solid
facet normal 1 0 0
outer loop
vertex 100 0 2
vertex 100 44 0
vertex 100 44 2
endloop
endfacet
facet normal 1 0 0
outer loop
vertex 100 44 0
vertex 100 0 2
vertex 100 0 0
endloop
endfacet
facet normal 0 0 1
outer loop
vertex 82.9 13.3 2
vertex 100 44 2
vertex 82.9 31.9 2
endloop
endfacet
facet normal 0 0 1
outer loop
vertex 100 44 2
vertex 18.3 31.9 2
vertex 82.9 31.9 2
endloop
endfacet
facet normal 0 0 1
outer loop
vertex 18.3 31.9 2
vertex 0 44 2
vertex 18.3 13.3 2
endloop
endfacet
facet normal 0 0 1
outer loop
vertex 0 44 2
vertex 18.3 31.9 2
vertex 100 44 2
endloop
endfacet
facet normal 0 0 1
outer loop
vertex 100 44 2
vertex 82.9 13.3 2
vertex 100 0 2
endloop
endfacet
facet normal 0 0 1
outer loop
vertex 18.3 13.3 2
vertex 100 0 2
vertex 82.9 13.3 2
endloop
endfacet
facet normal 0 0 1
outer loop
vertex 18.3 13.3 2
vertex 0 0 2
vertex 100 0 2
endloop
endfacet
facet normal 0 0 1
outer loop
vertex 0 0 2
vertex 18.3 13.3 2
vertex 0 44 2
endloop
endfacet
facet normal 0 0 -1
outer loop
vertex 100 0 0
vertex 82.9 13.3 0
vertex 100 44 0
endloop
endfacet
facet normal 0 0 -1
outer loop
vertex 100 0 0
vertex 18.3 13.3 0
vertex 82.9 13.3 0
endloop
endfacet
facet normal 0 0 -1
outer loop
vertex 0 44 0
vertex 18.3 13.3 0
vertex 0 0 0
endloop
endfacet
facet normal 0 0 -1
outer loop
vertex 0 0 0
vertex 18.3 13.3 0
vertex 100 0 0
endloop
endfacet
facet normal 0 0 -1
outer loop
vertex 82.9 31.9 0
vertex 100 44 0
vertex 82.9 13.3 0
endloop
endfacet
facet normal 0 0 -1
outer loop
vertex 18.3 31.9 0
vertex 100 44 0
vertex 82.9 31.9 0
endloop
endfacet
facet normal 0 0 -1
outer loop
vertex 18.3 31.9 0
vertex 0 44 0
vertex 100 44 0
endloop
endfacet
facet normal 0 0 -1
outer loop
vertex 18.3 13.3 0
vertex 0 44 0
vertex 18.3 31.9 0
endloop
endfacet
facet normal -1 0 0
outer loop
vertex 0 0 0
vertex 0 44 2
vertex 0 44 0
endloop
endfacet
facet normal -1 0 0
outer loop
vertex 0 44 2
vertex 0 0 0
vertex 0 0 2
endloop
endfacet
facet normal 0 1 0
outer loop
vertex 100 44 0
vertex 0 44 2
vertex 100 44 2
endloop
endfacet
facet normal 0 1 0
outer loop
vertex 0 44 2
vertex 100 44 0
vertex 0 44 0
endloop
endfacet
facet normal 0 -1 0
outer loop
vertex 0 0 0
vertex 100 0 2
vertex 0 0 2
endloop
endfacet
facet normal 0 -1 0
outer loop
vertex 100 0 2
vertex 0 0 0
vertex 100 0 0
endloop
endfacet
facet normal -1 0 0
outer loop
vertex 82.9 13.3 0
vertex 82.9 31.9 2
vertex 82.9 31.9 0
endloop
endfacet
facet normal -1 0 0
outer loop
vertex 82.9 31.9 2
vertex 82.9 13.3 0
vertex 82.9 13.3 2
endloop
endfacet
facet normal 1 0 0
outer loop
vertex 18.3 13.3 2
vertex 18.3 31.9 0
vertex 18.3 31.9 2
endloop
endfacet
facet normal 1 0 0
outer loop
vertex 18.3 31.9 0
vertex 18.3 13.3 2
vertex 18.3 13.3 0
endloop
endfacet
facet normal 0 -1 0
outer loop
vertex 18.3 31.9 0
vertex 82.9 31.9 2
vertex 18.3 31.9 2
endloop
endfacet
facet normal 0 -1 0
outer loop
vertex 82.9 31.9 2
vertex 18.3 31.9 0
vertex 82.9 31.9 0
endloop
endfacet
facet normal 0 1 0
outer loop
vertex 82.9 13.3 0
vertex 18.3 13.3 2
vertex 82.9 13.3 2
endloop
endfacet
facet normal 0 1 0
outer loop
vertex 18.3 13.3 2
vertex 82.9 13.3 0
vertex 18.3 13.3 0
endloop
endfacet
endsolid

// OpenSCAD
//Train platform for Train Display Case

view_part = 0; //[0:top,1:base]


/* [Hidden] */
pa = 0.3;
cd = 0.1; //small value to ensure holes are through
station_ramp_x = 168;
station_ramp_y = 40;
station_ramp_z = 10;
centre_flat_x = 100;
centre_flat_y = 43;

flat_offset_x = (station_ramp_x - centre_flat_x)/2;

top_z = 2;
top_x = 100;
top_y = 44;
display_base_x = 56+pa;
display_base_y = 12.5+pa;

gutter_x = 64+pa;//surround for bottom
gutter_y = 18+pa;
gutter_z = 5;
gutter_off_x = (station_ramp_x - gutter_x)/2;
gutter_off_y = (station_ramp_y - gutter_y)/2;
gutter_wall_x = (gutter_x-display_base_x-2*pa)/2;
gutter_wall_y = (gutter_y-display_base_y-2*pa)/2;
top_offset_x = top_x/2 - (gutter_x - 3*pa)/2;
top_offset_y = top_y/2 - (gutter_y - 3*pa)/2;


cable_slot_x = display_base_x-2;//some value
cable_slot_y = 8;
exit_slot_x = 6;
exit_slot_z = 6;
exit_slot_y = 20;


if (view_part == 0 ) top ();
    
if (view_part == 1 ) ramped_base ();
    
module ramped_base () {
    difference () {
        union () {
            hull () {
                cube ([station_ramp_x,station_ramp_y,cd]);
                
                translate ([flat_offset_x,0,0])
                    cube ([centre_flat_x,station_ramp_y,station_ramp_z]);
            }//end hull
            translate ([gutter_off_x,gutter_off_y,0])
            hollow_gutter ();
        }//end union
        
        //through cable slot
        translate ([station_ramp_x/2-cable_slot_x/2,station_ramp_y/2-cable_slot_y/2,-cd])
            cube ([cable_slot_x,cable_slot_y,20]);
        //hollow_out base
        
        hull () {
                translate ([5,5,-cd]) cube ([station_ramp_x-10,station_ramp_y-10,cd]);
                
                translate ([flat_offset_x,5,-cd])
                    cube ([centre_flat_x-10,station_ramp_y-10,station_ramp_z-3]);
            }//end hull
            
        //wall cable_slot
            translate ([station_ramp_x/2-3,-cd,-cd])
                cube ([6,10,3]);
            translate ([station_ramp_x/2,-cd,3]) rotate ([-90,0,0])
                cylinder (d=6,h=10,$fn=40);
    
    }//end diff
    //add cable tie slots to cube 
    difference () {
    translate ([station_ramp_x/2-5,0,0])
                cube ([10,12,10]);
        translate ([station_ramp_x/2-3,-cd,-cd])
                cube ([6,13,3]);
            translate ([station_ramp_x/2,-cd,3]) rotate ([-90,0,0])
                cylinder (d=6,h=13,$fn=40);
        translate ([station_ramp_x/2-6,6,-cd])
            cube ([15,3,2]);
        translate ([station_ramp_x/2-6,6,5])
            cube ([15,3,2]);
    }//end diff
}//end module

module hollow_gutter () {
    difference () {
        cube ([gutter_x-pa,gutter_y-pa,station_ramp_z+gutter_z]);
        
        translate ([gutter_wall_x,gutter_wall_y,-cd])
            cube ([gutter_x-2*gutter_wall_x,gutter_y-2*gutter_wall_y,station_ramp_z+gutter_z+2]);
        
    }//end diff
    
}// end module
    

module top () {
    difference () {
    cube ([top_x,top_y,top_z]);
    translate ([top_offset_x,top_offset_y,-cd])
        cube ([gutter_x+pa,gutter_y+pa,gutter_z]);
    }//end diff
}
